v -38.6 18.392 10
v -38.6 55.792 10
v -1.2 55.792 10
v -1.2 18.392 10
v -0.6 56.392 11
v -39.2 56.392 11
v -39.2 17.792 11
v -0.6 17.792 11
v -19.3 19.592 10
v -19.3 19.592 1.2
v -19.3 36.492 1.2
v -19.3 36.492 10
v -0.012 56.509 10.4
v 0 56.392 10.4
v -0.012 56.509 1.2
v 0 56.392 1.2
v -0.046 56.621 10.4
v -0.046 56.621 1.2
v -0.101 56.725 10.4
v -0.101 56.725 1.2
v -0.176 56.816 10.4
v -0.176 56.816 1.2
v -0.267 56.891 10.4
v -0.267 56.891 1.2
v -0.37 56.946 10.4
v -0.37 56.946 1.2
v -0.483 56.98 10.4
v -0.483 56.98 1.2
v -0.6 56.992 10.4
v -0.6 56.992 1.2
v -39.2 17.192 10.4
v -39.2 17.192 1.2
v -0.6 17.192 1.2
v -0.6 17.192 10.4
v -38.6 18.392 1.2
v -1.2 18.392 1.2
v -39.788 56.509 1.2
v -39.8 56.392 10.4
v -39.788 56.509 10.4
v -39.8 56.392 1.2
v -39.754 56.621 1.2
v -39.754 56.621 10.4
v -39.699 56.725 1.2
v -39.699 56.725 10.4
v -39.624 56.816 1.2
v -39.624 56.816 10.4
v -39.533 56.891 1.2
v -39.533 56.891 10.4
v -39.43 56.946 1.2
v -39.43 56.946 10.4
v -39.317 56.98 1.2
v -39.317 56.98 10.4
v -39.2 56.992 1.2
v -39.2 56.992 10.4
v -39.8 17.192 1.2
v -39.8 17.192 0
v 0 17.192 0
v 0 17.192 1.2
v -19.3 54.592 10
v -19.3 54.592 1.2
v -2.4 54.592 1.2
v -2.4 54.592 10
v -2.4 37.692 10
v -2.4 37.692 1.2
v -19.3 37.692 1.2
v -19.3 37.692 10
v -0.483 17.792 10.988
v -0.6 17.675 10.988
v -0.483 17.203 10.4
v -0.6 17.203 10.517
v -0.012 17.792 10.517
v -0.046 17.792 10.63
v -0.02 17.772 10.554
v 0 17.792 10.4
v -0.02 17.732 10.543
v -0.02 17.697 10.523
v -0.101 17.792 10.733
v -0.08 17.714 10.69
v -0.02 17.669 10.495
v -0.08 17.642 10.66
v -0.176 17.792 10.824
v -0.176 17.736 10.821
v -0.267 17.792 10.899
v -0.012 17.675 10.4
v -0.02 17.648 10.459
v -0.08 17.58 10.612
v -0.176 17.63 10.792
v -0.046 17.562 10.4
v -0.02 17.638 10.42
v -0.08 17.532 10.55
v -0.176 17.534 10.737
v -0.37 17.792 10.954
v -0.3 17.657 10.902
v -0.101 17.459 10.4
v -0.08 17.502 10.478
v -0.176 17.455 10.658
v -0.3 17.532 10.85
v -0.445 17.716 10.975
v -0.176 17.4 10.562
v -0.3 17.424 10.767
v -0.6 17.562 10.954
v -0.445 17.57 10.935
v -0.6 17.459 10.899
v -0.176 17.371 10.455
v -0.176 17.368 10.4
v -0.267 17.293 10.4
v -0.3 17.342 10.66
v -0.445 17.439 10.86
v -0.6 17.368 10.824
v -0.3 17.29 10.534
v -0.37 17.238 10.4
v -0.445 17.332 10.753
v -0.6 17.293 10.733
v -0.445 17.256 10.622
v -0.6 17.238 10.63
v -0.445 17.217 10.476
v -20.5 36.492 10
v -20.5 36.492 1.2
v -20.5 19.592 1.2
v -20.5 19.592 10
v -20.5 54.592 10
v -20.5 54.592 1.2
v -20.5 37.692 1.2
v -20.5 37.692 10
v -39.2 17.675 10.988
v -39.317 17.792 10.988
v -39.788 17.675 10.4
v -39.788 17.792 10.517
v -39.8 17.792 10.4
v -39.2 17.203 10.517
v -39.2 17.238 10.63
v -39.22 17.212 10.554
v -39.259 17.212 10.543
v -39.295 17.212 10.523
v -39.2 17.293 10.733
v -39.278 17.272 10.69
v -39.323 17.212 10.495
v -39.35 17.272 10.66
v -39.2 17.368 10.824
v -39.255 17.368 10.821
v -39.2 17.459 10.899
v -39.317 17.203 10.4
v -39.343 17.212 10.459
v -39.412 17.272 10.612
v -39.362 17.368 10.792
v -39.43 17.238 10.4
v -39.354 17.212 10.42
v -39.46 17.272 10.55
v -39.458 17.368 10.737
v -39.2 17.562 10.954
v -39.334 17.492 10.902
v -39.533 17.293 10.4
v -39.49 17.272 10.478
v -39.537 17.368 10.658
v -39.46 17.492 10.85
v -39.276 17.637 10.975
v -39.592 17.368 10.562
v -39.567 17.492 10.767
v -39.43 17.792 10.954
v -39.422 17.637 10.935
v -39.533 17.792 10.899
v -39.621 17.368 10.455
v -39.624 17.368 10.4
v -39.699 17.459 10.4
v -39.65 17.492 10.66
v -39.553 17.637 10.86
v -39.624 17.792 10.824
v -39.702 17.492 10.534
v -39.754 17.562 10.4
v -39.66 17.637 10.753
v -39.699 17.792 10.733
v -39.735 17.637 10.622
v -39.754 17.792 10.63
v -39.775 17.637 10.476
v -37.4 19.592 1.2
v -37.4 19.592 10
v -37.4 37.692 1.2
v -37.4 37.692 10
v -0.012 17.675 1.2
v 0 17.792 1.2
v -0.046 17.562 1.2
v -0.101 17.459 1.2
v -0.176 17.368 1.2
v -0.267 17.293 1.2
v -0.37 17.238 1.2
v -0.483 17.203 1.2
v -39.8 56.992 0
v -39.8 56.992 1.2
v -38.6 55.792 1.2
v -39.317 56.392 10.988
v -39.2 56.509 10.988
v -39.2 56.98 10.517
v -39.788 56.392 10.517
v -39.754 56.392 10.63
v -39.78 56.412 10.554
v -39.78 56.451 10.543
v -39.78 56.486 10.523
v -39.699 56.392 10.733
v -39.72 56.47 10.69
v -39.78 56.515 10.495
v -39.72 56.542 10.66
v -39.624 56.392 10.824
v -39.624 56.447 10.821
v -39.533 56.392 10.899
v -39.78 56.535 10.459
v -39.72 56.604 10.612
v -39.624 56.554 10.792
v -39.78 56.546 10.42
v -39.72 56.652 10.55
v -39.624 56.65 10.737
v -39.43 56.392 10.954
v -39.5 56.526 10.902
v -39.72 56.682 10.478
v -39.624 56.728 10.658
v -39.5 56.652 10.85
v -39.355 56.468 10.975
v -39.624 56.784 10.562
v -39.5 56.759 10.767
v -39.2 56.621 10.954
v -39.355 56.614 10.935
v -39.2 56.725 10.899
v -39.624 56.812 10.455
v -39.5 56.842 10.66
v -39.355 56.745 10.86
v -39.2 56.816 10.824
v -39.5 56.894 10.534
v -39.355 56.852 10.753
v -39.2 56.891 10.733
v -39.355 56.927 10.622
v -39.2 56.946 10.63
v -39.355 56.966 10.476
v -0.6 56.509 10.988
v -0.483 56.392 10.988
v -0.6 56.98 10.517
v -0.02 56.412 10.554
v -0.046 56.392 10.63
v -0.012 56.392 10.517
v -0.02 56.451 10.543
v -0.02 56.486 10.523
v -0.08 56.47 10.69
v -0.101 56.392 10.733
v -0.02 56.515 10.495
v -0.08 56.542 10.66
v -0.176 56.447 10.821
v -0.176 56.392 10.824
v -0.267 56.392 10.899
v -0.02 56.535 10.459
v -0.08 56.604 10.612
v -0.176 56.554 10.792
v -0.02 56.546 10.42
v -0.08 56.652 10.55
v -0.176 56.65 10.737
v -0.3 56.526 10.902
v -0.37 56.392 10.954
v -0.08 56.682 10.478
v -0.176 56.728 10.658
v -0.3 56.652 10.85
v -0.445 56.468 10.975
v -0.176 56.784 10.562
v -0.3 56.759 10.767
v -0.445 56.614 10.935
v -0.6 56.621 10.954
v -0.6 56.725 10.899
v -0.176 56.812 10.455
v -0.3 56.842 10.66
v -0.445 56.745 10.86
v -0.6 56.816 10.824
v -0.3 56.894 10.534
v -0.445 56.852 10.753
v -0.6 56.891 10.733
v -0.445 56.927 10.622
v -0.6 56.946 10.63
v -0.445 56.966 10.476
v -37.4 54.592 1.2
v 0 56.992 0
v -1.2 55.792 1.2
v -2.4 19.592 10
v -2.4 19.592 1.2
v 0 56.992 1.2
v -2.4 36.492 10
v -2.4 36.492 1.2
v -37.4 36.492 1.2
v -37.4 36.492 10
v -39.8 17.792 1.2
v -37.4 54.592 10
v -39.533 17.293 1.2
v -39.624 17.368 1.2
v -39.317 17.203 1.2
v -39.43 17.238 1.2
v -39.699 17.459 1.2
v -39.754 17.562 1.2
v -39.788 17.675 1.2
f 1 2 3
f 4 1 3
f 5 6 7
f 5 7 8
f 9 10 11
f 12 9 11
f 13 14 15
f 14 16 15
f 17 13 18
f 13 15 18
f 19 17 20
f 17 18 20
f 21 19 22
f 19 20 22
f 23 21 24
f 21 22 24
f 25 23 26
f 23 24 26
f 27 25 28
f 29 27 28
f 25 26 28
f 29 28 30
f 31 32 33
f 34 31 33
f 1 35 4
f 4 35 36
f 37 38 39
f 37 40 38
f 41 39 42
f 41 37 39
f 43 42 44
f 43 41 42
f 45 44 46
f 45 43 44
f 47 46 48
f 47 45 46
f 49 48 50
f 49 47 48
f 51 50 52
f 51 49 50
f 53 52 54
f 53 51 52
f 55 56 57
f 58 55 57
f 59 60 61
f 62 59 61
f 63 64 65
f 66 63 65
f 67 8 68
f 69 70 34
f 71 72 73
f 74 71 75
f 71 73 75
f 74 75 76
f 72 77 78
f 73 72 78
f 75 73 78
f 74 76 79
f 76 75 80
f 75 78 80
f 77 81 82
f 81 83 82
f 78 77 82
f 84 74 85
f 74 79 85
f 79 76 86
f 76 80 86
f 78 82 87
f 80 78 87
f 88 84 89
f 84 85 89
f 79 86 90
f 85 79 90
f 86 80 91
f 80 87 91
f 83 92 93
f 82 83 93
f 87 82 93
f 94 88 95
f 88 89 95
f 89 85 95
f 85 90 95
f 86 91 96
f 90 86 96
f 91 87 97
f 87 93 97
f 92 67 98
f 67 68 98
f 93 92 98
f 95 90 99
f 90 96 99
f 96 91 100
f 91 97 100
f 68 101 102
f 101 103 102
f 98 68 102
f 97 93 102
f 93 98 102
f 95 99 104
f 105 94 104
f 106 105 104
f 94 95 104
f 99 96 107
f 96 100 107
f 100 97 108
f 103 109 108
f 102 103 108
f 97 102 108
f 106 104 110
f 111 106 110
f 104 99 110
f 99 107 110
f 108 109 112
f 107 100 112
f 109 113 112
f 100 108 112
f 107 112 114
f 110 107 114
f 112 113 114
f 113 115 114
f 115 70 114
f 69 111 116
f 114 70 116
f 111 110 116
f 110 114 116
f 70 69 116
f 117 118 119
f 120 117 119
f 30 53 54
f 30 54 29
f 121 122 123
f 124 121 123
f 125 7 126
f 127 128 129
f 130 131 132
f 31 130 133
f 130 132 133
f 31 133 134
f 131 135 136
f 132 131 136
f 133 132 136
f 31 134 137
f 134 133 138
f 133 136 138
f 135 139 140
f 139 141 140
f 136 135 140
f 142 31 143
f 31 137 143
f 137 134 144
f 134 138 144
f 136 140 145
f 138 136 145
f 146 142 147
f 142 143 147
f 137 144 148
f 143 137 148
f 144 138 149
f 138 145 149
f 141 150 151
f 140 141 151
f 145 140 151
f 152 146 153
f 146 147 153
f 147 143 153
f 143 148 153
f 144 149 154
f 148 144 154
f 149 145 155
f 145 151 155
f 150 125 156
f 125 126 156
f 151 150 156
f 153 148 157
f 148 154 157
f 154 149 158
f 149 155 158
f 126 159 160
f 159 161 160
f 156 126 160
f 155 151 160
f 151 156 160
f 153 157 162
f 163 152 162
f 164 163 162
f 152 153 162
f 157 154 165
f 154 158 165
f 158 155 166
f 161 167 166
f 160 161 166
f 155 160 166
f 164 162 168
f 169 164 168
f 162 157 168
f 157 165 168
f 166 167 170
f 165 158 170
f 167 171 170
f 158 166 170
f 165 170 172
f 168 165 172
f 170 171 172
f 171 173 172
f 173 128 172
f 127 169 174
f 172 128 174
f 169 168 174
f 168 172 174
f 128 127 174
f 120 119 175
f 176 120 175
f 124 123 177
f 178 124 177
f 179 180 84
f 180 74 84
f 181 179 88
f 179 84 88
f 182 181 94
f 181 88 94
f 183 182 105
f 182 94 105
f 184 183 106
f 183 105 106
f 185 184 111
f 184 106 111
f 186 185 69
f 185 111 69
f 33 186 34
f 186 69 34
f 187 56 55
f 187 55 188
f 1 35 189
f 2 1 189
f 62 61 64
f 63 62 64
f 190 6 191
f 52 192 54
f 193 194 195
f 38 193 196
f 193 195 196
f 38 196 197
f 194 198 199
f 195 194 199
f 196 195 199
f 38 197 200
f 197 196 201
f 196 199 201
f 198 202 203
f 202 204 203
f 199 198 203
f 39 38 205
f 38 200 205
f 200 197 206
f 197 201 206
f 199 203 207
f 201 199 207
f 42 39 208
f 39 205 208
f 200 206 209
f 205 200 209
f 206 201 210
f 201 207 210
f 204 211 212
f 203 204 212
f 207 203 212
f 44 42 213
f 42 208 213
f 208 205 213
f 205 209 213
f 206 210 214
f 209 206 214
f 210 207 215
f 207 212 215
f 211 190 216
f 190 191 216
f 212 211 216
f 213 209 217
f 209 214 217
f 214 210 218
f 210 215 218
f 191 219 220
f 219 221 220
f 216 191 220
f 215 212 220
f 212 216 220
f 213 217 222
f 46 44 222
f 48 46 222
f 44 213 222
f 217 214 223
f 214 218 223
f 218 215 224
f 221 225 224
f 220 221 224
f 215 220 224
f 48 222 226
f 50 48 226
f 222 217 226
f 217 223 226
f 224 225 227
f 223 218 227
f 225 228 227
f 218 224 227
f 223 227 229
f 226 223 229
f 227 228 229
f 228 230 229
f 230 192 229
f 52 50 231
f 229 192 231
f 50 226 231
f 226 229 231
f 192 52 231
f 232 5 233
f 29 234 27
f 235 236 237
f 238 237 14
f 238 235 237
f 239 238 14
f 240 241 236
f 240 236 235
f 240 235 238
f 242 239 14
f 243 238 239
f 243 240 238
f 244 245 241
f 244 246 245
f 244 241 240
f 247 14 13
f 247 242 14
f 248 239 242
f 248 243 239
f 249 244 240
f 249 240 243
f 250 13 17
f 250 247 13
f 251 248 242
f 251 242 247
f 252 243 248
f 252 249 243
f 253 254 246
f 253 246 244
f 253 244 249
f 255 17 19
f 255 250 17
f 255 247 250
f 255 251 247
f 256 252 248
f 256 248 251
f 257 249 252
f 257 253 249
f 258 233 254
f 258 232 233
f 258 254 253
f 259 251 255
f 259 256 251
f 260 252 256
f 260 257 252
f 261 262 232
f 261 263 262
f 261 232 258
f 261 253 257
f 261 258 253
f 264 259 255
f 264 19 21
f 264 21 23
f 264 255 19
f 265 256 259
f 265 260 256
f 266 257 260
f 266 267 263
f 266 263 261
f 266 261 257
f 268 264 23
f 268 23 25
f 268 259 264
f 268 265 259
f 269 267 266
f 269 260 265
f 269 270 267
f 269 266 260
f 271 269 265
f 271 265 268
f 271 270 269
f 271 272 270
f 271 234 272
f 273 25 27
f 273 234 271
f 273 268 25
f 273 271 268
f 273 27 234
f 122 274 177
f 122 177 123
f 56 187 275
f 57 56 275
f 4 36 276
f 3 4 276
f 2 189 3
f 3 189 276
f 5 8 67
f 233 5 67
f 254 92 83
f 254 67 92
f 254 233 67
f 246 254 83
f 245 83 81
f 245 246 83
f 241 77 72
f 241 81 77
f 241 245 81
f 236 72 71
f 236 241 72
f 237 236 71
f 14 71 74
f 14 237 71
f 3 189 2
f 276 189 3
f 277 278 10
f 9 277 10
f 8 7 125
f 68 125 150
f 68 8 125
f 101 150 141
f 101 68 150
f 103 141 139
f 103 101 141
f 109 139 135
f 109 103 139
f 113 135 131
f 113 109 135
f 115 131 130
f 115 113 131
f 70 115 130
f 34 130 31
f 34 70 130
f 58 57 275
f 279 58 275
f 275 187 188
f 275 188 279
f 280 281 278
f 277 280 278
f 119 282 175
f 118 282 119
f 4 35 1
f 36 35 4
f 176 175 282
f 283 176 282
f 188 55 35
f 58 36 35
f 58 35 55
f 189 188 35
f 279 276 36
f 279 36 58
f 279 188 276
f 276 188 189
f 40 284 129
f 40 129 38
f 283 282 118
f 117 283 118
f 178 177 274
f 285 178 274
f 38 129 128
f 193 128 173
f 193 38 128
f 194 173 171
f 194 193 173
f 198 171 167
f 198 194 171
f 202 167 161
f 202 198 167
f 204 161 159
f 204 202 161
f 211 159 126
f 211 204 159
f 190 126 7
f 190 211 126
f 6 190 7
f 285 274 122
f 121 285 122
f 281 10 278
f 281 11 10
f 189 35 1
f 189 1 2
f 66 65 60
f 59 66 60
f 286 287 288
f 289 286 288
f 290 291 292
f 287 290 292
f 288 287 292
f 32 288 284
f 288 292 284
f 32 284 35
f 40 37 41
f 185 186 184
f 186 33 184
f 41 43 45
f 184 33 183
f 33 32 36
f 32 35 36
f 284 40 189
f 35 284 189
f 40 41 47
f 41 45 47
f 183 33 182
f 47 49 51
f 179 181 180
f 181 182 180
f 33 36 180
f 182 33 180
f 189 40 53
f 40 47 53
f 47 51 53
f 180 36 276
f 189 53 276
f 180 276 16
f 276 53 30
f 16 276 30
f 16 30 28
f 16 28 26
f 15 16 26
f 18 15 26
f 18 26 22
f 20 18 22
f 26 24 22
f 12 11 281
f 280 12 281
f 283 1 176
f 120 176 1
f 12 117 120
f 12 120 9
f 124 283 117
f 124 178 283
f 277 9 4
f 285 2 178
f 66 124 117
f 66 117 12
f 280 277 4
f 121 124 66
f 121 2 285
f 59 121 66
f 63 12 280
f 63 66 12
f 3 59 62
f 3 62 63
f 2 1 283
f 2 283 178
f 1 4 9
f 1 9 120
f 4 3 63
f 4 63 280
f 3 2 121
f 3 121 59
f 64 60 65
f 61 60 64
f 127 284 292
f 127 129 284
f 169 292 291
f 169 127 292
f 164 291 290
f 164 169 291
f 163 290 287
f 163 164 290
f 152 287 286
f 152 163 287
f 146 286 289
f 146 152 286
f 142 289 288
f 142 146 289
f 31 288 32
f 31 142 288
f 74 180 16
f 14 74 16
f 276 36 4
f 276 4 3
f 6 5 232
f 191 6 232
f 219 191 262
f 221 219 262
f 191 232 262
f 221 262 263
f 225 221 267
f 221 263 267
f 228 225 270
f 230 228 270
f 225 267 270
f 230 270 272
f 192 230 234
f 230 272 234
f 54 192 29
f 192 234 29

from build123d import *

# Parameters (mm, degrees)
F0_W     = 39.8
F0_H     = 39.8
F0_W_2   = 37.4
F0_H_2   = 37.4
F0_W_3   = 16.9
F0_H_3   = 16.9
F1_DEPTH = 1.2
F2_DEPTH = 10
F3_START = 1.2
F3_DEPTH = 9.8
F4_START = 10
F4_DEPTH = 1
F5_R     = 0.6


with BuildPart() as f1:
    # F0 (on Top) → F1 (new body)
    with BuildSketch(Plane.XY):
        with Locations((-19.9, 37.0918591321)):
            Rectangle(F0_W, F0_H)
        with Locations((-19.9, 37.0918591321)):
            Rectangle(F0_W_2, F0_H_2, mode=Mode.SUBTRACT)
        with Locations((-19.9, 37.0918591321)):
            Rectangle(F0_W_2, F0_H_2)
        Polygon((-37.4, 37.6918591321), (-37.4, 54.5918591321), (-20.5, 54.5918591321), (-19.3, 54.5918591321), (-2.4, 54.5918591321), (-2.4, 37.6918591321), (-2.4, 36.4918591321), (-2.4, 19.5918591321), (-19.3, 19.5918591321), (-20.5, 19.5918591321), (-37.4, 19.5918591321), (-37.4, 36.4918591321), align=None, mode=Mode.SUBTRACT)
        with Locations((-10.85, 46.1418591321)):
            Rectangle(F0_W_3, F0_H_3)
        with Locations((-28.95, 28.0418591321)):
            Rectangle(F0_W_3, F0_H_3)
        with Locations((-28.95, 46.1418591321)):
            Rectangle(F0_W_3, F0_H_3)
        with Locations((-10.85, 28.0418591321)):
            Rectangle(F0_W_3, F0_H_3)
        Polygon((-19.3, 54.5918591321), (-20.5, 54.5918591321), (-20.5, 37.6918591321), (-37.4, 37.6918591321), (-37.4, 36.4918591321), (-20.5, 36.4918591321), (-20.5, 19.5918591321), (-19.3, 19.5918591321), (-19.3, 36.4918591321), (-2.4, 36.4918591321), (-2.4, 37.6918591321), (-19.3, 37.6918591321), align=None)
    extrude(amount=F1_DEPTH)

    # F0 (on Top) → F2 (join)
    with BuildSketch(Plane.XY):
        with Locations((-19.9, 37.0918591321)):
            Rectangle(F0_W_2, F0_H_2)
        Polygon((-37.4, 37.6918591321), (-37.4, 54.5918591321), (-20.5, 54.5918591321), (-19.3, 54.5918591321), (-2.4, 54.5918591321), (-2.4, 37.6918591321), (-2.4, 36.4918591321), (-2.4, 19.5918591321), (-19.3, 19.5918591321), (-20.5, 19.5918591321), (-37.4, 19.5918591321), (-37.4, 36.4918591321), align=None, mode=Mode.SUBTRACT)
        Polygon((-19.3, 54.5918591321), (-20.5, 54.5918591321), (-20.5, 37.6918591321), (-37.4, 37.6918591321), (-37.4, 36.4918591321), (-20.5, 36.4918591321), (-20.5, 19.5918591321), (-19.3, 19.5918591321), (-19.3, 36.4918591321), (-2.4, 36.4918591321), (-2.4, 37.6918591321), (-19.3, 37.6918591321), align=None)
    extrude(amount=F2_DEPTH)


with BuildPart() as f3:
    # F0 (on Top) → F3 (new body)
    with BuildSketch(Plane.XY.offset(F3_START)):
        with Locations((-19.9, 37.0918591321)):
            Rectangle(F0_W, F0_H)
        with Locations((-19.9, 37.0918591321)):
            Rectangle(F0_W_2, F0_H_2, mode=Mode.SUBTRACT)
    extrude(amount=F3_DEPTH)

    # F0 (on Top) → F4 (join)
    with BuildSketch(Plane.XY.offset(F4_START)):
        with Locations((-19.9, 37.0918591321)):
            Rectangle(F0_W, F0_H)
        with Locations((-19.9, 37.0918591321)):
            Rectangle(F0_W_2, F0_H_2, mode=Mode.SUBTRACT)
        with Locations((-19.9, 37.0918591321)):
            Rectangle(F0_W_2, F0_H_2)
        Polygon((-37.4, 37.6918591321), (-37.4, 54.5918591321), (-20.5, 54.5918591321), (-19.3, 54.5918591321), (-2.4, 54.5918591321), (-2.4, 37.6918591321), (-2.4, 36.4918591321), (-2.4, 19.5918591321), (-19.3, 19.5918591321), (-20.5, 19.5918591321), (-37.4, 19.5918591321), (-37.4, 36.4918591321), align=None, mode=Mode.SUBTRACT)
        with Locations((-28.95, 46.1418591321)):
            Rectangle(F0_W_3, F0_H_3)
        with Locations((-10.85, 46.1418591321)):
            Rectangle(F0_W_3, F0_H_3)
        with Locations((-10.85, 28.0418591321)):
            Rectangle(F0_W_3, F0_H_3)
        with Locations((-28.95, 28.0418591321)):
            Rectangle(F0_W_3, F0_H_3)
        Polygon((-19.3, 54.5918591321), (-20.5, 54.5918591321), (-20.5, 37.6918591321), (-37.4, 37.6918591321), (-37.4, 36.4918591321), (-20.5, 36.4918591321), (-20.5, 19.5918591321), (-19.3, 19.5918591321), (-19.3, 36.4918591321), (-2.4, 36.4918591321), (-2.4, 37.6918591321), (-19.3, 37.6918591321), align=None)
    extrude(amount=F4_DEPTH)

    # F5
    f5_edges = [f3.edges().sort_by_distance(p)[0] for p in [
        (-19.9, 56.991859, 11),
        (-39.8, 37.091859, 11),
        (-19.9, 17.191859, 11),
        (0, 37.091859, 11),
        (-39.8, 56.991859, 6.1),
        (-39.8, 17.191859, 6.1),
        (0, 17.191859, 6.1),
        (0, 56.991859, 6.1),
    ]]
    fillet(f5_edges, radius=F5_R)


solid = Compound([f1.part, f3.part])
